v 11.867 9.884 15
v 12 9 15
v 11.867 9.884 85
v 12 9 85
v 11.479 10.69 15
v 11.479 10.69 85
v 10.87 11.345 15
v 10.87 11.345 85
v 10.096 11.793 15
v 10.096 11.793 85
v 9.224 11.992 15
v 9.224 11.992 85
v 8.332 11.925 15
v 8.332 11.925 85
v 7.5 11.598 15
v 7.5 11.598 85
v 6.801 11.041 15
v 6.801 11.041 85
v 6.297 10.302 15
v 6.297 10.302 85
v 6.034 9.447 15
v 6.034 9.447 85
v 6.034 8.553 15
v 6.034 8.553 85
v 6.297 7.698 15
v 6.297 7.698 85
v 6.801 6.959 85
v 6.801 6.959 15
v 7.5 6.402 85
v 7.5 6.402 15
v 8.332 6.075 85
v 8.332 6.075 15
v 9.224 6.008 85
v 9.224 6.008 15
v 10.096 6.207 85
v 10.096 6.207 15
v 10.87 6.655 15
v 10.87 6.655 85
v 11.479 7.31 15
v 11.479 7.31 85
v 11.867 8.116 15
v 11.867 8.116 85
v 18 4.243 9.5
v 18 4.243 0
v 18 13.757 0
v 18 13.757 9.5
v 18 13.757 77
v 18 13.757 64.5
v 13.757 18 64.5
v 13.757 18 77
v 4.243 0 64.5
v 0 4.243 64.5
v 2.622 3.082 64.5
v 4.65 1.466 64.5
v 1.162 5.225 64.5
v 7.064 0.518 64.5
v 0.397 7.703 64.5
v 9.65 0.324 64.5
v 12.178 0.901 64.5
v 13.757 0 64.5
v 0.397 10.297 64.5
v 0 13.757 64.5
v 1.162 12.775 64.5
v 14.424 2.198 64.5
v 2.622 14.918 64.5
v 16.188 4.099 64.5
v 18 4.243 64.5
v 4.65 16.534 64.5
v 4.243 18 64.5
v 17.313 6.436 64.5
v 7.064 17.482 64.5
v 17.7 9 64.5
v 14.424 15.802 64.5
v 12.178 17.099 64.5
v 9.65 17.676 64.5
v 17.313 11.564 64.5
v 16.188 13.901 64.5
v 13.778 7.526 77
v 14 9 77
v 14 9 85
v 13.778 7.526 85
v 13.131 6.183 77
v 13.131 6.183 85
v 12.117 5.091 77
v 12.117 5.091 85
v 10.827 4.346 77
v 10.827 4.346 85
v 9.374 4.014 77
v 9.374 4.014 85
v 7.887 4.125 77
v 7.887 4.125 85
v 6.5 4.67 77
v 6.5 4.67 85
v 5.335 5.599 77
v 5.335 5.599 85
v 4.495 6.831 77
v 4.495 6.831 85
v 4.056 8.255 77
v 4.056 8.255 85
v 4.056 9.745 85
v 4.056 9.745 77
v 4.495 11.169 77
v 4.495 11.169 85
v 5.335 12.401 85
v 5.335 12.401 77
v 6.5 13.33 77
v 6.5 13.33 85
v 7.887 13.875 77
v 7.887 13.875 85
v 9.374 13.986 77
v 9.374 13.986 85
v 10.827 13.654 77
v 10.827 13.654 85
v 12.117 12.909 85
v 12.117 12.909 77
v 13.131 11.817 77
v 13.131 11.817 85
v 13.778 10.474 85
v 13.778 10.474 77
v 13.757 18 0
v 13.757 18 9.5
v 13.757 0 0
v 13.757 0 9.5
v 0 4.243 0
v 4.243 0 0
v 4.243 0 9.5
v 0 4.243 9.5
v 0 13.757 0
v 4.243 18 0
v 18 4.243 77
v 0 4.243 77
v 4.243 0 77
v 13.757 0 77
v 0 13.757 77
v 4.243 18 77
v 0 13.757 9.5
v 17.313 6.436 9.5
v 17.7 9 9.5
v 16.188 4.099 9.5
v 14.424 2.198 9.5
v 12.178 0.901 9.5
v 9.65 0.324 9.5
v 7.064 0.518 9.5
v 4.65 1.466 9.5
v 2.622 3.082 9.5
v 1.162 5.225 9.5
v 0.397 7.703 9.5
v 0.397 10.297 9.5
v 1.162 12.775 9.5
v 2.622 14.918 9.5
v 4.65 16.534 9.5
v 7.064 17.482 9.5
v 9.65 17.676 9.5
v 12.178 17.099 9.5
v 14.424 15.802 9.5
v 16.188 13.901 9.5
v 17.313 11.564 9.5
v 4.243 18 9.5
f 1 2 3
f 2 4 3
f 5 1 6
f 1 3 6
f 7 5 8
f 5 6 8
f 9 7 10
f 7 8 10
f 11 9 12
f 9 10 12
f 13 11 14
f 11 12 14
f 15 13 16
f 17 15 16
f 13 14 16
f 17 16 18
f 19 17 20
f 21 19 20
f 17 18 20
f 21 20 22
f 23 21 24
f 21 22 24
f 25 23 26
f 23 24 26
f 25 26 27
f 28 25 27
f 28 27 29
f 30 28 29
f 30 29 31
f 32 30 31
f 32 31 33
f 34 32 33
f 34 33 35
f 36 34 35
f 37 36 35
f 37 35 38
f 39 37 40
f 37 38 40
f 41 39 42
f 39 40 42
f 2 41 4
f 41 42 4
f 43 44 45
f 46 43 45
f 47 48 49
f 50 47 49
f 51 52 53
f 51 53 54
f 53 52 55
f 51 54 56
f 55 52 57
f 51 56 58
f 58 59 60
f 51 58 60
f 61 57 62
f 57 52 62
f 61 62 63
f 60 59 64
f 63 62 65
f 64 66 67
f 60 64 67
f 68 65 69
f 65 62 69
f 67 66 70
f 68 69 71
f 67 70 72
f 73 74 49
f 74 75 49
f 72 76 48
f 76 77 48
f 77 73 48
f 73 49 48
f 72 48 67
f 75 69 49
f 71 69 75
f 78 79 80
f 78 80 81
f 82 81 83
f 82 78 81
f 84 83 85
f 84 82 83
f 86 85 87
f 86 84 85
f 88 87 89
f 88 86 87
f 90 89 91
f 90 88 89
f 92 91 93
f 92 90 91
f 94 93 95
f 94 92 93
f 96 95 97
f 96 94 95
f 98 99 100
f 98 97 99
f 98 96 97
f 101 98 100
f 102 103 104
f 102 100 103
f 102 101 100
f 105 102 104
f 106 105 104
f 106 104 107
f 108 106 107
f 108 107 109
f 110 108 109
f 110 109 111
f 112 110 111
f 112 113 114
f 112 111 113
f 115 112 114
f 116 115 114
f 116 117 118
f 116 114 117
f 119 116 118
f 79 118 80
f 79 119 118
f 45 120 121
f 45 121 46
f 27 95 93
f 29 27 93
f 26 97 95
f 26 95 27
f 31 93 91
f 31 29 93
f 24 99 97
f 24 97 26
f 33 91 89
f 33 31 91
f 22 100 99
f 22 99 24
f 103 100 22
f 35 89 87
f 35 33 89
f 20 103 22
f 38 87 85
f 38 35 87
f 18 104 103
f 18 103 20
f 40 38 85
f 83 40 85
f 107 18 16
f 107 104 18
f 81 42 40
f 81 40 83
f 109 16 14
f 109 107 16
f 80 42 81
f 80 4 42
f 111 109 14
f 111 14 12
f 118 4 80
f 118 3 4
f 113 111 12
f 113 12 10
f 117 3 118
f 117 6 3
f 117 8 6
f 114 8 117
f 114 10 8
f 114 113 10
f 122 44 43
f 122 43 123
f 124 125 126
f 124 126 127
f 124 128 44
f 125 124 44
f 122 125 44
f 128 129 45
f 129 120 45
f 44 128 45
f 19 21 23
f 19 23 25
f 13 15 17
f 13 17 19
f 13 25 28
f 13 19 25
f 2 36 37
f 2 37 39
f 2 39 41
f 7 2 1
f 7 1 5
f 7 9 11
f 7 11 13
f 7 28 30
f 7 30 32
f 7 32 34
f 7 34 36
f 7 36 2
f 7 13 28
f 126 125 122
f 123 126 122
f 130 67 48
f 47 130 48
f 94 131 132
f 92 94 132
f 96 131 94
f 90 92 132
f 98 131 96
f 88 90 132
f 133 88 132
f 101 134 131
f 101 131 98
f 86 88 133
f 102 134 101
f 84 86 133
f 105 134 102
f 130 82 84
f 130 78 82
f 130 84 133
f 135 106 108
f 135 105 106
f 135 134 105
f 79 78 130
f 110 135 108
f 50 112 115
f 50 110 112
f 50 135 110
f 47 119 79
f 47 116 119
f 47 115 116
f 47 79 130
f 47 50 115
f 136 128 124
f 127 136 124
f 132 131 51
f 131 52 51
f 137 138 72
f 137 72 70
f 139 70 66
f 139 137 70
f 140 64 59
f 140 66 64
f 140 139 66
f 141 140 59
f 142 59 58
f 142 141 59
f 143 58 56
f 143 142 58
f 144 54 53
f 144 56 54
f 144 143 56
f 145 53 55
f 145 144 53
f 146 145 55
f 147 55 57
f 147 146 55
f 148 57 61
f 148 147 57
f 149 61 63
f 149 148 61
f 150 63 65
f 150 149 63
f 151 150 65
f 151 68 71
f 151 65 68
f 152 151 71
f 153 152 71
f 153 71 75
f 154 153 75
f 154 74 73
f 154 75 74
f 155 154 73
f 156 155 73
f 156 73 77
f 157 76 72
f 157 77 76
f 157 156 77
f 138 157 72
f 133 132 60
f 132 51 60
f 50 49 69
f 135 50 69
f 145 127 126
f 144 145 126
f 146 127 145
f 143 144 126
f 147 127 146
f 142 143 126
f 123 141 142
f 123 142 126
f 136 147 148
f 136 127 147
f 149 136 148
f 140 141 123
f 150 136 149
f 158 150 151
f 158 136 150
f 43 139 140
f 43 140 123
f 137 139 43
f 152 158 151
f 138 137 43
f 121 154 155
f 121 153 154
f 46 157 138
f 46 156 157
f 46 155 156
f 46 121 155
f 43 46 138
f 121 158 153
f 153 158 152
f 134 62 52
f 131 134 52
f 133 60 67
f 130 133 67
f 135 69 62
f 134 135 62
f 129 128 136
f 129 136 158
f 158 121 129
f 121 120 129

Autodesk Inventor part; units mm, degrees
ref_plane "YZ Plane" through (0, 0, 0) normal (1, 0, 0) x (0, 1, 0)
ref_plane "XZ Plane" through (0, 0, 0) normal (0, 1, 0) x (-1, 0, 0)
ref_plane "XY Plane" through (0, 0, 0) normal (0, 0, 1) x (1, 0, 0)
sketch "スケッチ1" plane through (0, 0, 0) normal (0, 0, 1) x (1, 0, 0)
  line L0 (0, 0) -> (18, 0)
  line L1 (18, 0) -> (18, 18)
  line L2 (18, 18) -> (0, 18)
  line L3 (0, 18) -> (0, 0)
  line L4 (0, 13.7574) -> (4.2426, 18)
  line L5 (0, 13.7574) -> (6, 13.7574) construction
  line L6 (4.2426, 0) -> (0, 4.2426)
  line L7 (18, 4.2426) -> (13.7574, 0)
  line L8 (13.7574, 18) -> (18, 13.7574)
  point P0 (0, 9)
  point P1 (9, 18)
  point P2 (9, 9)
  dimension "d0" = 18
  dimension "d1" = 18
  dimension "d2" = 45
  dimension "d3" = 3
  dimension "d13" = 9
  dimension "d14" = 9
  dimension "d17" = 360
extrude "押し出し1" add sketch "スケッチ1" along normal blind 9.5 contours L6 L3 L4 L2 L8 L1 L7 L0
sketch "スケッチ2" plane through (0, 0, 9.5) normal (0, 0, 1) x (1, 0, 0)
  line L0 (0, 0) -> (13.7574, 0) projected
  line L1 (0, 13.7574) -> (0, 0) projected
  circle A0 centre (9, 9) radius 8.7
  point P0 (9, 0)
  point P1 (5.6569, 0)
  point P2 (12.3431, 0)
  point P3 (0, 9.7071)
  point P4 (0, 5.6569)
  point P5 (18, 0)
  point P6 (0, 18)
  dimension "d10" = 17.4
extrude "押し出し2" add sketch "スケッチ2" along normal blind 55
sketch "スケッチ3" plane through (9, 9, 64.5) normal (0, 0, 1) x (1, 0, 0)
  circle A0 centre (0, 0) radius 8.7 projected
  line L0 (4.7574, 9) -> (-4.7574, 9) projected
  line L1 (-4.7574, 9) -> (-9, 4.7574) projected
  line L2 (-9, 4.7574) -> (-9, -4.7574) projected
  line L3 (-9, -4.7574) -> (-4.7574, -9) projected
  line L4 (-4.7574, -9) -> (4.7574, -9) projected
  line L5 (4.7574, -9) -> (9, -4.7574) projected
  line L6 (9, -4.7574) -> (9, 4.7574) projected
  line L7 (9, 4.7574) -> (4.7574, 9) projected
  point P0 (-9, -9)
extrude "押し出し3" add sketch "スケッチ3" along normal blind 12.5 contours A0 | L7 L6 L5 L4 L3 L2 L1 L0
sketch "スケッチ4" plane through (9, 9, 77) normal (0, 0, 1) x (1, 0, 0)
  circle A0 centre (0, 0) radius 8.7 projected
  circle A1 centre (0, 0) radius 5
  point P0 (-9, -9)
  dimension "d21" = 10
extrude "押し出し4" add sketch "スケッチ4" along normal blind 8 contours A1
sketch "スケッチ5" plane through (9, 9, 85) normal (0, 0, 1) x (1, 0, 0)
  circle A0 centre (0, 0) radius 5 projected
  circle A1 centre (0, 0) radius 3
  point P0 (-9, -9)
  dimension "d24" = 6
extrude "押し出し5" cut sketch "スケッチ5" against normal blind 70 contours A1
equation "\"d13\" = 0.5 * d1"
properties part number "airclinder_30" material "アルミニウム 6061-AHC"
